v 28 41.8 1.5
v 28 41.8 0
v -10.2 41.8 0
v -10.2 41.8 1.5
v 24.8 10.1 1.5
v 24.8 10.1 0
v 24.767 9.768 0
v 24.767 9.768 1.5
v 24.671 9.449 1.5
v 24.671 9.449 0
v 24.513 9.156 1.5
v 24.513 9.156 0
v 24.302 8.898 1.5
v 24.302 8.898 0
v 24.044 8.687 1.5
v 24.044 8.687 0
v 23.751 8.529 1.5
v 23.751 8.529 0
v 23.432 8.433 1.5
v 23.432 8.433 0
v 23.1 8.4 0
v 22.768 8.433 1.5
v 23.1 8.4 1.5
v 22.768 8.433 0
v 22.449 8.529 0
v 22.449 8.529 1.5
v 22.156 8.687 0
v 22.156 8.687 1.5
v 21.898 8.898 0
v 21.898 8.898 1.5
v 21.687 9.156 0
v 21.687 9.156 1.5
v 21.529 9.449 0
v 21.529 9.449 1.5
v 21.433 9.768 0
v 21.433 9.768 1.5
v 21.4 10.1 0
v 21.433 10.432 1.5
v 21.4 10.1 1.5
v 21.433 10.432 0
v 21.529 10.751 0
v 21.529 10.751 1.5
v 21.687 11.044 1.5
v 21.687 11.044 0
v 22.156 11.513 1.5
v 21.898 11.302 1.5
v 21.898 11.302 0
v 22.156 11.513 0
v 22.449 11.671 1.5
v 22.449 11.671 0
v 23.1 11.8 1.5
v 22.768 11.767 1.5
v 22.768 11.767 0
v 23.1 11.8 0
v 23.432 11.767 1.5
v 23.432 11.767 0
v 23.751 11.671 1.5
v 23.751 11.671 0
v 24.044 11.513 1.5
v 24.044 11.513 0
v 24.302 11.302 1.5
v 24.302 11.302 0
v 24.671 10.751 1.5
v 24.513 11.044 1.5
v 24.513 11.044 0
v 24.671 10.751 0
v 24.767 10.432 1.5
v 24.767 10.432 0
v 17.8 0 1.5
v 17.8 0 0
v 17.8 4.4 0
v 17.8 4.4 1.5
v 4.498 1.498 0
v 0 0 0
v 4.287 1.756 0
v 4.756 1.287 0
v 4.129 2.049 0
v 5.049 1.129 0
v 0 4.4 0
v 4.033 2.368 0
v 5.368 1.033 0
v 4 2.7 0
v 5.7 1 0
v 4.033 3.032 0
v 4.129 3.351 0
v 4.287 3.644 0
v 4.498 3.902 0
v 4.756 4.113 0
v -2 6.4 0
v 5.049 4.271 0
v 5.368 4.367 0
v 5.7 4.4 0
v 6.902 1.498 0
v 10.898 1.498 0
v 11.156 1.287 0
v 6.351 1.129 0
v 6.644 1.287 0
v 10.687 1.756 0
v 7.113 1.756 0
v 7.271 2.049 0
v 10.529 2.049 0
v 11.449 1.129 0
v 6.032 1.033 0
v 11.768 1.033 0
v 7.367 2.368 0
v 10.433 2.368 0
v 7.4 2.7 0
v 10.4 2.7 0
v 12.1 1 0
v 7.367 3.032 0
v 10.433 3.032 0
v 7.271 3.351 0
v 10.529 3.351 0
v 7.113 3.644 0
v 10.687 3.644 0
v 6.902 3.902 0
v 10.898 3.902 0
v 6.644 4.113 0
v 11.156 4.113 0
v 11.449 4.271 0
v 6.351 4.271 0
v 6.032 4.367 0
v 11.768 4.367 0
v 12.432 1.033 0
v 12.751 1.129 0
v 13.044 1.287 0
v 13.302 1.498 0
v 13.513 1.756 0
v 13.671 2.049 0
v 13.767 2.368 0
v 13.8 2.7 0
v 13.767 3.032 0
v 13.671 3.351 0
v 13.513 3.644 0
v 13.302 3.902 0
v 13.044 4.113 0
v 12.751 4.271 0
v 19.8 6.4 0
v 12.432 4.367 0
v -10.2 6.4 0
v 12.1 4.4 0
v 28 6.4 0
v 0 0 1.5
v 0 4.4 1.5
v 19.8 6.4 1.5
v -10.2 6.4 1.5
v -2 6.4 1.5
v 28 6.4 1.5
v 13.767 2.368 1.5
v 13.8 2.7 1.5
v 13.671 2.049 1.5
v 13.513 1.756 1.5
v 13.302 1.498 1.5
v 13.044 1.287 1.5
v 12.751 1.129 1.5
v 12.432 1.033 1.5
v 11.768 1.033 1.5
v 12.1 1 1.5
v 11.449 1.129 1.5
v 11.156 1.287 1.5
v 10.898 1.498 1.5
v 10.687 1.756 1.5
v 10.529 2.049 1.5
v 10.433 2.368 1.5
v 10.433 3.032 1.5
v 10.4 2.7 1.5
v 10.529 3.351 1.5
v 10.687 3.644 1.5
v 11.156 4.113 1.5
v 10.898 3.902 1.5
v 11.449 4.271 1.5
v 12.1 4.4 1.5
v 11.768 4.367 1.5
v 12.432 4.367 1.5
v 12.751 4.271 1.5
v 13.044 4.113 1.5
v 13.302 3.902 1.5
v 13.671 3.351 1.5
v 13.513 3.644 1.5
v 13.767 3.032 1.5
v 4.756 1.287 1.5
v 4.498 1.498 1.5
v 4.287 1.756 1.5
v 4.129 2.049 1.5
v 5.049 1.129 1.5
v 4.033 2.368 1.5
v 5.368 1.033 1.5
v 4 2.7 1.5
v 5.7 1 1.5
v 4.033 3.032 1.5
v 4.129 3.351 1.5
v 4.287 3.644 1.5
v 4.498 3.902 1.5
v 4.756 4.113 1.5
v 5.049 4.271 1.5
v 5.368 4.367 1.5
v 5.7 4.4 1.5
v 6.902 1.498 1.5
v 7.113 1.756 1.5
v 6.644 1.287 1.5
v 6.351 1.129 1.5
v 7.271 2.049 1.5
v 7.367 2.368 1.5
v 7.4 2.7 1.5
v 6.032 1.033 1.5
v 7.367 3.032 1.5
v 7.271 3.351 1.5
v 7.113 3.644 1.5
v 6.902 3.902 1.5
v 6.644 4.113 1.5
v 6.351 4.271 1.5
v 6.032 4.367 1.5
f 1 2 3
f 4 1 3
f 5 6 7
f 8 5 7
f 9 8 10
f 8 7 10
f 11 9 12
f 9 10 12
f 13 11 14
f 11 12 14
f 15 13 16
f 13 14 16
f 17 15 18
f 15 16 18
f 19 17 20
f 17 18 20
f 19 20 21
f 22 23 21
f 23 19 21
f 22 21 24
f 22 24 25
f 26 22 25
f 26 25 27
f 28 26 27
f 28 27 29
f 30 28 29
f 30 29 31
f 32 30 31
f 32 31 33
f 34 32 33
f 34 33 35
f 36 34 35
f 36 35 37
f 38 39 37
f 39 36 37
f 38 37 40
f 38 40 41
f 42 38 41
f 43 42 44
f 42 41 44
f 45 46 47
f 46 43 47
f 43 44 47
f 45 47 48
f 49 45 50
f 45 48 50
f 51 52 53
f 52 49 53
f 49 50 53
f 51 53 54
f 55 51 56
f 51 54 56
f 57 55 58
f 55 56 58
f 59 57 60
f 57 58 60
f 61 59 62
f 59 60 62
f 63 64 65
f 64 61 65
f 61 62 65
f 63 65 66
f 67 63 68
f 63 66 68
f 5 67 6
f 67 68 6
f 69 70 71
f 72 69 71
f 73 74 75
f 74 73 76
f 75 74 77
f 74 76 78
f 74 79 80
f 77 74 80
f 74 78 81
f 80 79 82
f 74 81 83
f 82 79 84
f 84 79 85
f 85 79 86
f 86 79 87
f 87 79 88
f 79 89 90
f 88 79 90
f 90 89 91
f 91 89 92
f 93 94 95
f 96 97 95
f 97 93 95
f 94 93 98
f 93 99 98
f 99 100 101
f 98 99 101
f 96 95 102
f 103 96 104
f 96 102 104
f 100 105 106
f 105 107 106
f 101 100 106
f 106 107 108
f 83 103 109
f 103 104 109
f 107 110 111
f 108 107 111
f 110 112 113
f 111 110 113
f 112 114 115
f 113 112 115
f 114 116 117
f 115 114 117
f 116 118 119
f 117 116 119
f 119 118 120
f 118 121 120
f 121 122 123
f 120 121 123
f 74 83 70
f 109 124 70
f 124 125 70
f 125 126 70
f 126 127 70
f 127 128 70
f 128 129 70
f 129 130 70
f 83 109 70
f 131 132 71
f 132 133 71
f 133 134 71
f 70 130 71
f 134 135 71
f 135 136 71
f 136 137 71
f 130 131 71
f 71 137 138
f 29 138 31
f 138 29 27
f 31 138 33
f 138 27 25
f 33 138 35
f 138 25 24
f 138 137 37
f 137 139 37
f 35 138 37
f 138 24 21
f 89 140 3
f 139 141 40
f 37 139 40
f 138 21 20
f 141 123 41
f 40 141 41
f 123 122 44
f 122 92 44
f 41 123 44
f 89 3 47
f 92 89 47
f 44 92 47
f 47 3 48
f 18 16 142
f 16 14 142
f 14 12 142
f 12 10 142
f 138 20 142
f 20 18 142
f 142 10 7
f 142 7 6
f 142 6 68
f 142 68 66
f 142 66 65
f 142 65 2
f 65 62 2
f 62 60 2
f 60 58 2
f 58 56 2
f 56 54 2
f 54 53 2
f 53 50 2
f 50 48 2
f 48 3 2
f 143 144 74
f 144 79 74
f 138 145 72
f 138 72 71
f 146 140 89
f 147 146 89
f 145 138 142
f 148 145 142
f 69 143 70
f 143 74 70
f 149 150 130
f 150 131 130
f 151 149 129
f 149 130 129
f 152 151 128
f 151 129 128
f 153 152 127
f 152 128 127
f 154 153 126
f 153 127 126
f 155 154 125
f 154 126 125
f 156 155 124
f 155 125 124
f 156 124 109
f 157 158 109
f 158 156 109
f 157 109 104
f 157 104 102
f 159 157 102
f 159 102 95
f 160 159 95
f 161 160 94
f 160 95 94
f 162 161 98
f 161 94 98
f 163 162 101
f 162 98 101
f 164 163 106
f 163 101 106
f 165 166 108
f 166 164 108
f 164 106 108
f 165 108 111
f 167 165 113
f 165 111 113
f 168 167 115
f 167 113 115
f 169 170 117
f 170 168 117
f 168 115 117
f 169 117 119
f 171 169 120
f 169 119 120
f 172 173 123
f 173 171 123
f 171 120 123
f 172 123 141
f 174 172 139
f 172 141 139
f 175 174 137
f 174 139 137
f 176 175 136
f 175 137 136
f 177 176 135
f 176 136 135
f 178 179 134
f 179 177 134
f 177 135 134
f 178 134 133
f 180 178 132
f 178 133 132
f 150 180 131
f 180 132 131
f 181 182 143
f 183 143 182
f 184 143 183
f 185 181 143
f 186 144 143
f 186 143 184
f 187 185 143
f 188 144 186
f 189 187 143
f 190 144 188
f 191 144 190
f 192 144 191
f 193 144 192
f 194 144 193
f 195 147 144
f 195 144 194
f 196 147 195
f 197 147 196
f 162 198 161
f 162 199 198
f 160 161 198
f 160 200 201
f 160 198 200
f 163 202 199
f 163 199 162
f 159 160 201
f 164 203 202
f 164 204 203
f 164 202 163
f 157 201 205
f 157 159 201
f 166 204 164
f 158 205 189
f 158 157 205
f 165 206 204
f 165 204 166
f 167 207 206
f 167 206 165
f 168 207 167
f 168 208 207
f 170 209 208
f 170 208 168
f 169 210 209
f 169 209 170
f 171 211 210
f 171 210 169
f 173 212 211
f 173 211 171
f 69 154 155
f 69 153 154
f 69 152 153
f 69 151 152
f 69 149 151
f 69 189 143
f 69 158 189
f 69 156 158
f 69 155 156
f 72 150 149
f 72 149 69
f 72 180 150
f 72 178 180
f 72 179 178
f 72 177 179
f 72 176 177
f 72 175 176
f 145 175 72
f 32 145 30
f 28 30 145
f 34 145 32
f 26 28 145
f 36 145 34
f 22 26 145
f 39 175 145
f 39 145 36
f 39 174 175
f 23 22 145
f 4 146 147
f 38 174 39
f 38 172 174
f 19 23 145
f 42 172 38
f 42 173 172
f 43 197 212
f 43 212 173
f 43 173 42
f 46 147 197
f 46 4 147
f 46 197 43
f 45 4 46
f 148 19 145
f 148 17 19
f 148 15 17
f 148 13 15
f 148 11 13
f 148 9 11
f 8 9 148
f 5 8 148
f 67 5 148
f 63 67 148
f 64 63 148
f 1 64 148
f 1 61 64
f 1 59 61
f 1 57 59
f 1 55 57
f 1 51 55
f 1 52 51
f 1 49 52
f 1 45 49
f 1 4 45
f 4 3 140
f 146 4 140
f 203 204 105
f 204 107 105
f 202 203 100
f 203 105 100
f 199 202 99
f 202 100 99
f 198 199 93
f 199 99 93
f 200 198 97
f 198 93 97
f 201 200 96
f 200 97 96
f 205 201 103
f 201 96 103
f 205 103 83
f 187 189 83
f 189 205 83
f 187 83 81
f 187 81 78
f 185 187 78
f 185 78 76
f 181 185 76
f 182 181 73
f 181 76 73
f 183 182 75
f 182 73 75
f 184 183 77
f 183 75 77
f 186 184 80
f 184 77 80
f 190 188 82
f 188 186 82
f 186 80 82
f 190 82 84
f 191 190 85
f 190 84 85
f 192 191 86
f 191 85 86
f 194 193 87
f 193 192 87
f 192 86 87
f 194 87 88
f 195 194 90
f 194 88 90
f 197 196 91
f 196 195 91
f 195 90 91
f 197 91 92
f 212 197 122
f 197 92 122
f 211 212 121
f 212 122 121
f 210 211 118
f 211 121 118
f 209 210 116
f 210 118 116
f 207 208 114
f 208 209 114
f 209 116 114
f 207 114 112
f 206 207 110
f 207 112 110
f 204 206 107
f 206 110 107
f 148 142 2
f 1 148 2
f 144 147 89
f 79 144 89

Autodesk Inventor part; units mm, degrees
ref_plane "YZ Plane" through (0, 0, 0) normal (1, 0, 0) x (0, 1, 0)
ref_plane "XZ Plane" through (0, 0, 0) normal (0, 1, 0) x (-1, 0, 0)
ref_plane "XY Plane" through (0, 0, 0) normal (0, 0, 1) x (1, 0, 0)
sketch "スケッチ1" plane through (0, 0, 0) normal (0, 0, 1) x (1, 0, 0)
  line L0 (0, 0) -> (17.8, 0)
  line L1 (17.8, 0) -> (17.8, 6.4)
  line L2 (17.8, 6.4) -> (28, 6.4)
  line L3 (28, 6.4) -> (28, 41.8)
  line L4 (28, 41.8) -> (-10.2, 41.8)
  line L5 (-10.2, 41.8) -> (-10.2, 6.4)
  line L6 (-10.2, 6.4) -> (0, 6.4)
  line L7 (0, 6.4) -> (0, 0)
  line L8 (0, 2.7) -> (17.8, 2.7) construction
  circle A0 centre (5.7, 2.7) radius 1.7
  circle A1 centre (12.1, 2.7) radius 1.7
  circle A2 centre (23.1, 10.1) radius 1.7
  dimension "d0" = 3.4
  dimension "d1" = 17.8
  dimension "d2" = 6.4
  dimension "d3" = 5.7
  dimension "d4" = 2.7
  dimension "d5" = 6.4
  dimension "d6" = 35.4
  dimension "d7" = 38.2
  dimension "d8" = 10.2
  dimension "d9" = 4.9
  dimension "d10" = 3.7
extrude "押し出し1" add sketch "スケッチ1" along normal blind 1.5
chamfer "面取り1" distance 2 angle 45 2 edges at (17.8, 6.4, 0.75) (0, 6.4, 0.75)
properties part number "pixy"
